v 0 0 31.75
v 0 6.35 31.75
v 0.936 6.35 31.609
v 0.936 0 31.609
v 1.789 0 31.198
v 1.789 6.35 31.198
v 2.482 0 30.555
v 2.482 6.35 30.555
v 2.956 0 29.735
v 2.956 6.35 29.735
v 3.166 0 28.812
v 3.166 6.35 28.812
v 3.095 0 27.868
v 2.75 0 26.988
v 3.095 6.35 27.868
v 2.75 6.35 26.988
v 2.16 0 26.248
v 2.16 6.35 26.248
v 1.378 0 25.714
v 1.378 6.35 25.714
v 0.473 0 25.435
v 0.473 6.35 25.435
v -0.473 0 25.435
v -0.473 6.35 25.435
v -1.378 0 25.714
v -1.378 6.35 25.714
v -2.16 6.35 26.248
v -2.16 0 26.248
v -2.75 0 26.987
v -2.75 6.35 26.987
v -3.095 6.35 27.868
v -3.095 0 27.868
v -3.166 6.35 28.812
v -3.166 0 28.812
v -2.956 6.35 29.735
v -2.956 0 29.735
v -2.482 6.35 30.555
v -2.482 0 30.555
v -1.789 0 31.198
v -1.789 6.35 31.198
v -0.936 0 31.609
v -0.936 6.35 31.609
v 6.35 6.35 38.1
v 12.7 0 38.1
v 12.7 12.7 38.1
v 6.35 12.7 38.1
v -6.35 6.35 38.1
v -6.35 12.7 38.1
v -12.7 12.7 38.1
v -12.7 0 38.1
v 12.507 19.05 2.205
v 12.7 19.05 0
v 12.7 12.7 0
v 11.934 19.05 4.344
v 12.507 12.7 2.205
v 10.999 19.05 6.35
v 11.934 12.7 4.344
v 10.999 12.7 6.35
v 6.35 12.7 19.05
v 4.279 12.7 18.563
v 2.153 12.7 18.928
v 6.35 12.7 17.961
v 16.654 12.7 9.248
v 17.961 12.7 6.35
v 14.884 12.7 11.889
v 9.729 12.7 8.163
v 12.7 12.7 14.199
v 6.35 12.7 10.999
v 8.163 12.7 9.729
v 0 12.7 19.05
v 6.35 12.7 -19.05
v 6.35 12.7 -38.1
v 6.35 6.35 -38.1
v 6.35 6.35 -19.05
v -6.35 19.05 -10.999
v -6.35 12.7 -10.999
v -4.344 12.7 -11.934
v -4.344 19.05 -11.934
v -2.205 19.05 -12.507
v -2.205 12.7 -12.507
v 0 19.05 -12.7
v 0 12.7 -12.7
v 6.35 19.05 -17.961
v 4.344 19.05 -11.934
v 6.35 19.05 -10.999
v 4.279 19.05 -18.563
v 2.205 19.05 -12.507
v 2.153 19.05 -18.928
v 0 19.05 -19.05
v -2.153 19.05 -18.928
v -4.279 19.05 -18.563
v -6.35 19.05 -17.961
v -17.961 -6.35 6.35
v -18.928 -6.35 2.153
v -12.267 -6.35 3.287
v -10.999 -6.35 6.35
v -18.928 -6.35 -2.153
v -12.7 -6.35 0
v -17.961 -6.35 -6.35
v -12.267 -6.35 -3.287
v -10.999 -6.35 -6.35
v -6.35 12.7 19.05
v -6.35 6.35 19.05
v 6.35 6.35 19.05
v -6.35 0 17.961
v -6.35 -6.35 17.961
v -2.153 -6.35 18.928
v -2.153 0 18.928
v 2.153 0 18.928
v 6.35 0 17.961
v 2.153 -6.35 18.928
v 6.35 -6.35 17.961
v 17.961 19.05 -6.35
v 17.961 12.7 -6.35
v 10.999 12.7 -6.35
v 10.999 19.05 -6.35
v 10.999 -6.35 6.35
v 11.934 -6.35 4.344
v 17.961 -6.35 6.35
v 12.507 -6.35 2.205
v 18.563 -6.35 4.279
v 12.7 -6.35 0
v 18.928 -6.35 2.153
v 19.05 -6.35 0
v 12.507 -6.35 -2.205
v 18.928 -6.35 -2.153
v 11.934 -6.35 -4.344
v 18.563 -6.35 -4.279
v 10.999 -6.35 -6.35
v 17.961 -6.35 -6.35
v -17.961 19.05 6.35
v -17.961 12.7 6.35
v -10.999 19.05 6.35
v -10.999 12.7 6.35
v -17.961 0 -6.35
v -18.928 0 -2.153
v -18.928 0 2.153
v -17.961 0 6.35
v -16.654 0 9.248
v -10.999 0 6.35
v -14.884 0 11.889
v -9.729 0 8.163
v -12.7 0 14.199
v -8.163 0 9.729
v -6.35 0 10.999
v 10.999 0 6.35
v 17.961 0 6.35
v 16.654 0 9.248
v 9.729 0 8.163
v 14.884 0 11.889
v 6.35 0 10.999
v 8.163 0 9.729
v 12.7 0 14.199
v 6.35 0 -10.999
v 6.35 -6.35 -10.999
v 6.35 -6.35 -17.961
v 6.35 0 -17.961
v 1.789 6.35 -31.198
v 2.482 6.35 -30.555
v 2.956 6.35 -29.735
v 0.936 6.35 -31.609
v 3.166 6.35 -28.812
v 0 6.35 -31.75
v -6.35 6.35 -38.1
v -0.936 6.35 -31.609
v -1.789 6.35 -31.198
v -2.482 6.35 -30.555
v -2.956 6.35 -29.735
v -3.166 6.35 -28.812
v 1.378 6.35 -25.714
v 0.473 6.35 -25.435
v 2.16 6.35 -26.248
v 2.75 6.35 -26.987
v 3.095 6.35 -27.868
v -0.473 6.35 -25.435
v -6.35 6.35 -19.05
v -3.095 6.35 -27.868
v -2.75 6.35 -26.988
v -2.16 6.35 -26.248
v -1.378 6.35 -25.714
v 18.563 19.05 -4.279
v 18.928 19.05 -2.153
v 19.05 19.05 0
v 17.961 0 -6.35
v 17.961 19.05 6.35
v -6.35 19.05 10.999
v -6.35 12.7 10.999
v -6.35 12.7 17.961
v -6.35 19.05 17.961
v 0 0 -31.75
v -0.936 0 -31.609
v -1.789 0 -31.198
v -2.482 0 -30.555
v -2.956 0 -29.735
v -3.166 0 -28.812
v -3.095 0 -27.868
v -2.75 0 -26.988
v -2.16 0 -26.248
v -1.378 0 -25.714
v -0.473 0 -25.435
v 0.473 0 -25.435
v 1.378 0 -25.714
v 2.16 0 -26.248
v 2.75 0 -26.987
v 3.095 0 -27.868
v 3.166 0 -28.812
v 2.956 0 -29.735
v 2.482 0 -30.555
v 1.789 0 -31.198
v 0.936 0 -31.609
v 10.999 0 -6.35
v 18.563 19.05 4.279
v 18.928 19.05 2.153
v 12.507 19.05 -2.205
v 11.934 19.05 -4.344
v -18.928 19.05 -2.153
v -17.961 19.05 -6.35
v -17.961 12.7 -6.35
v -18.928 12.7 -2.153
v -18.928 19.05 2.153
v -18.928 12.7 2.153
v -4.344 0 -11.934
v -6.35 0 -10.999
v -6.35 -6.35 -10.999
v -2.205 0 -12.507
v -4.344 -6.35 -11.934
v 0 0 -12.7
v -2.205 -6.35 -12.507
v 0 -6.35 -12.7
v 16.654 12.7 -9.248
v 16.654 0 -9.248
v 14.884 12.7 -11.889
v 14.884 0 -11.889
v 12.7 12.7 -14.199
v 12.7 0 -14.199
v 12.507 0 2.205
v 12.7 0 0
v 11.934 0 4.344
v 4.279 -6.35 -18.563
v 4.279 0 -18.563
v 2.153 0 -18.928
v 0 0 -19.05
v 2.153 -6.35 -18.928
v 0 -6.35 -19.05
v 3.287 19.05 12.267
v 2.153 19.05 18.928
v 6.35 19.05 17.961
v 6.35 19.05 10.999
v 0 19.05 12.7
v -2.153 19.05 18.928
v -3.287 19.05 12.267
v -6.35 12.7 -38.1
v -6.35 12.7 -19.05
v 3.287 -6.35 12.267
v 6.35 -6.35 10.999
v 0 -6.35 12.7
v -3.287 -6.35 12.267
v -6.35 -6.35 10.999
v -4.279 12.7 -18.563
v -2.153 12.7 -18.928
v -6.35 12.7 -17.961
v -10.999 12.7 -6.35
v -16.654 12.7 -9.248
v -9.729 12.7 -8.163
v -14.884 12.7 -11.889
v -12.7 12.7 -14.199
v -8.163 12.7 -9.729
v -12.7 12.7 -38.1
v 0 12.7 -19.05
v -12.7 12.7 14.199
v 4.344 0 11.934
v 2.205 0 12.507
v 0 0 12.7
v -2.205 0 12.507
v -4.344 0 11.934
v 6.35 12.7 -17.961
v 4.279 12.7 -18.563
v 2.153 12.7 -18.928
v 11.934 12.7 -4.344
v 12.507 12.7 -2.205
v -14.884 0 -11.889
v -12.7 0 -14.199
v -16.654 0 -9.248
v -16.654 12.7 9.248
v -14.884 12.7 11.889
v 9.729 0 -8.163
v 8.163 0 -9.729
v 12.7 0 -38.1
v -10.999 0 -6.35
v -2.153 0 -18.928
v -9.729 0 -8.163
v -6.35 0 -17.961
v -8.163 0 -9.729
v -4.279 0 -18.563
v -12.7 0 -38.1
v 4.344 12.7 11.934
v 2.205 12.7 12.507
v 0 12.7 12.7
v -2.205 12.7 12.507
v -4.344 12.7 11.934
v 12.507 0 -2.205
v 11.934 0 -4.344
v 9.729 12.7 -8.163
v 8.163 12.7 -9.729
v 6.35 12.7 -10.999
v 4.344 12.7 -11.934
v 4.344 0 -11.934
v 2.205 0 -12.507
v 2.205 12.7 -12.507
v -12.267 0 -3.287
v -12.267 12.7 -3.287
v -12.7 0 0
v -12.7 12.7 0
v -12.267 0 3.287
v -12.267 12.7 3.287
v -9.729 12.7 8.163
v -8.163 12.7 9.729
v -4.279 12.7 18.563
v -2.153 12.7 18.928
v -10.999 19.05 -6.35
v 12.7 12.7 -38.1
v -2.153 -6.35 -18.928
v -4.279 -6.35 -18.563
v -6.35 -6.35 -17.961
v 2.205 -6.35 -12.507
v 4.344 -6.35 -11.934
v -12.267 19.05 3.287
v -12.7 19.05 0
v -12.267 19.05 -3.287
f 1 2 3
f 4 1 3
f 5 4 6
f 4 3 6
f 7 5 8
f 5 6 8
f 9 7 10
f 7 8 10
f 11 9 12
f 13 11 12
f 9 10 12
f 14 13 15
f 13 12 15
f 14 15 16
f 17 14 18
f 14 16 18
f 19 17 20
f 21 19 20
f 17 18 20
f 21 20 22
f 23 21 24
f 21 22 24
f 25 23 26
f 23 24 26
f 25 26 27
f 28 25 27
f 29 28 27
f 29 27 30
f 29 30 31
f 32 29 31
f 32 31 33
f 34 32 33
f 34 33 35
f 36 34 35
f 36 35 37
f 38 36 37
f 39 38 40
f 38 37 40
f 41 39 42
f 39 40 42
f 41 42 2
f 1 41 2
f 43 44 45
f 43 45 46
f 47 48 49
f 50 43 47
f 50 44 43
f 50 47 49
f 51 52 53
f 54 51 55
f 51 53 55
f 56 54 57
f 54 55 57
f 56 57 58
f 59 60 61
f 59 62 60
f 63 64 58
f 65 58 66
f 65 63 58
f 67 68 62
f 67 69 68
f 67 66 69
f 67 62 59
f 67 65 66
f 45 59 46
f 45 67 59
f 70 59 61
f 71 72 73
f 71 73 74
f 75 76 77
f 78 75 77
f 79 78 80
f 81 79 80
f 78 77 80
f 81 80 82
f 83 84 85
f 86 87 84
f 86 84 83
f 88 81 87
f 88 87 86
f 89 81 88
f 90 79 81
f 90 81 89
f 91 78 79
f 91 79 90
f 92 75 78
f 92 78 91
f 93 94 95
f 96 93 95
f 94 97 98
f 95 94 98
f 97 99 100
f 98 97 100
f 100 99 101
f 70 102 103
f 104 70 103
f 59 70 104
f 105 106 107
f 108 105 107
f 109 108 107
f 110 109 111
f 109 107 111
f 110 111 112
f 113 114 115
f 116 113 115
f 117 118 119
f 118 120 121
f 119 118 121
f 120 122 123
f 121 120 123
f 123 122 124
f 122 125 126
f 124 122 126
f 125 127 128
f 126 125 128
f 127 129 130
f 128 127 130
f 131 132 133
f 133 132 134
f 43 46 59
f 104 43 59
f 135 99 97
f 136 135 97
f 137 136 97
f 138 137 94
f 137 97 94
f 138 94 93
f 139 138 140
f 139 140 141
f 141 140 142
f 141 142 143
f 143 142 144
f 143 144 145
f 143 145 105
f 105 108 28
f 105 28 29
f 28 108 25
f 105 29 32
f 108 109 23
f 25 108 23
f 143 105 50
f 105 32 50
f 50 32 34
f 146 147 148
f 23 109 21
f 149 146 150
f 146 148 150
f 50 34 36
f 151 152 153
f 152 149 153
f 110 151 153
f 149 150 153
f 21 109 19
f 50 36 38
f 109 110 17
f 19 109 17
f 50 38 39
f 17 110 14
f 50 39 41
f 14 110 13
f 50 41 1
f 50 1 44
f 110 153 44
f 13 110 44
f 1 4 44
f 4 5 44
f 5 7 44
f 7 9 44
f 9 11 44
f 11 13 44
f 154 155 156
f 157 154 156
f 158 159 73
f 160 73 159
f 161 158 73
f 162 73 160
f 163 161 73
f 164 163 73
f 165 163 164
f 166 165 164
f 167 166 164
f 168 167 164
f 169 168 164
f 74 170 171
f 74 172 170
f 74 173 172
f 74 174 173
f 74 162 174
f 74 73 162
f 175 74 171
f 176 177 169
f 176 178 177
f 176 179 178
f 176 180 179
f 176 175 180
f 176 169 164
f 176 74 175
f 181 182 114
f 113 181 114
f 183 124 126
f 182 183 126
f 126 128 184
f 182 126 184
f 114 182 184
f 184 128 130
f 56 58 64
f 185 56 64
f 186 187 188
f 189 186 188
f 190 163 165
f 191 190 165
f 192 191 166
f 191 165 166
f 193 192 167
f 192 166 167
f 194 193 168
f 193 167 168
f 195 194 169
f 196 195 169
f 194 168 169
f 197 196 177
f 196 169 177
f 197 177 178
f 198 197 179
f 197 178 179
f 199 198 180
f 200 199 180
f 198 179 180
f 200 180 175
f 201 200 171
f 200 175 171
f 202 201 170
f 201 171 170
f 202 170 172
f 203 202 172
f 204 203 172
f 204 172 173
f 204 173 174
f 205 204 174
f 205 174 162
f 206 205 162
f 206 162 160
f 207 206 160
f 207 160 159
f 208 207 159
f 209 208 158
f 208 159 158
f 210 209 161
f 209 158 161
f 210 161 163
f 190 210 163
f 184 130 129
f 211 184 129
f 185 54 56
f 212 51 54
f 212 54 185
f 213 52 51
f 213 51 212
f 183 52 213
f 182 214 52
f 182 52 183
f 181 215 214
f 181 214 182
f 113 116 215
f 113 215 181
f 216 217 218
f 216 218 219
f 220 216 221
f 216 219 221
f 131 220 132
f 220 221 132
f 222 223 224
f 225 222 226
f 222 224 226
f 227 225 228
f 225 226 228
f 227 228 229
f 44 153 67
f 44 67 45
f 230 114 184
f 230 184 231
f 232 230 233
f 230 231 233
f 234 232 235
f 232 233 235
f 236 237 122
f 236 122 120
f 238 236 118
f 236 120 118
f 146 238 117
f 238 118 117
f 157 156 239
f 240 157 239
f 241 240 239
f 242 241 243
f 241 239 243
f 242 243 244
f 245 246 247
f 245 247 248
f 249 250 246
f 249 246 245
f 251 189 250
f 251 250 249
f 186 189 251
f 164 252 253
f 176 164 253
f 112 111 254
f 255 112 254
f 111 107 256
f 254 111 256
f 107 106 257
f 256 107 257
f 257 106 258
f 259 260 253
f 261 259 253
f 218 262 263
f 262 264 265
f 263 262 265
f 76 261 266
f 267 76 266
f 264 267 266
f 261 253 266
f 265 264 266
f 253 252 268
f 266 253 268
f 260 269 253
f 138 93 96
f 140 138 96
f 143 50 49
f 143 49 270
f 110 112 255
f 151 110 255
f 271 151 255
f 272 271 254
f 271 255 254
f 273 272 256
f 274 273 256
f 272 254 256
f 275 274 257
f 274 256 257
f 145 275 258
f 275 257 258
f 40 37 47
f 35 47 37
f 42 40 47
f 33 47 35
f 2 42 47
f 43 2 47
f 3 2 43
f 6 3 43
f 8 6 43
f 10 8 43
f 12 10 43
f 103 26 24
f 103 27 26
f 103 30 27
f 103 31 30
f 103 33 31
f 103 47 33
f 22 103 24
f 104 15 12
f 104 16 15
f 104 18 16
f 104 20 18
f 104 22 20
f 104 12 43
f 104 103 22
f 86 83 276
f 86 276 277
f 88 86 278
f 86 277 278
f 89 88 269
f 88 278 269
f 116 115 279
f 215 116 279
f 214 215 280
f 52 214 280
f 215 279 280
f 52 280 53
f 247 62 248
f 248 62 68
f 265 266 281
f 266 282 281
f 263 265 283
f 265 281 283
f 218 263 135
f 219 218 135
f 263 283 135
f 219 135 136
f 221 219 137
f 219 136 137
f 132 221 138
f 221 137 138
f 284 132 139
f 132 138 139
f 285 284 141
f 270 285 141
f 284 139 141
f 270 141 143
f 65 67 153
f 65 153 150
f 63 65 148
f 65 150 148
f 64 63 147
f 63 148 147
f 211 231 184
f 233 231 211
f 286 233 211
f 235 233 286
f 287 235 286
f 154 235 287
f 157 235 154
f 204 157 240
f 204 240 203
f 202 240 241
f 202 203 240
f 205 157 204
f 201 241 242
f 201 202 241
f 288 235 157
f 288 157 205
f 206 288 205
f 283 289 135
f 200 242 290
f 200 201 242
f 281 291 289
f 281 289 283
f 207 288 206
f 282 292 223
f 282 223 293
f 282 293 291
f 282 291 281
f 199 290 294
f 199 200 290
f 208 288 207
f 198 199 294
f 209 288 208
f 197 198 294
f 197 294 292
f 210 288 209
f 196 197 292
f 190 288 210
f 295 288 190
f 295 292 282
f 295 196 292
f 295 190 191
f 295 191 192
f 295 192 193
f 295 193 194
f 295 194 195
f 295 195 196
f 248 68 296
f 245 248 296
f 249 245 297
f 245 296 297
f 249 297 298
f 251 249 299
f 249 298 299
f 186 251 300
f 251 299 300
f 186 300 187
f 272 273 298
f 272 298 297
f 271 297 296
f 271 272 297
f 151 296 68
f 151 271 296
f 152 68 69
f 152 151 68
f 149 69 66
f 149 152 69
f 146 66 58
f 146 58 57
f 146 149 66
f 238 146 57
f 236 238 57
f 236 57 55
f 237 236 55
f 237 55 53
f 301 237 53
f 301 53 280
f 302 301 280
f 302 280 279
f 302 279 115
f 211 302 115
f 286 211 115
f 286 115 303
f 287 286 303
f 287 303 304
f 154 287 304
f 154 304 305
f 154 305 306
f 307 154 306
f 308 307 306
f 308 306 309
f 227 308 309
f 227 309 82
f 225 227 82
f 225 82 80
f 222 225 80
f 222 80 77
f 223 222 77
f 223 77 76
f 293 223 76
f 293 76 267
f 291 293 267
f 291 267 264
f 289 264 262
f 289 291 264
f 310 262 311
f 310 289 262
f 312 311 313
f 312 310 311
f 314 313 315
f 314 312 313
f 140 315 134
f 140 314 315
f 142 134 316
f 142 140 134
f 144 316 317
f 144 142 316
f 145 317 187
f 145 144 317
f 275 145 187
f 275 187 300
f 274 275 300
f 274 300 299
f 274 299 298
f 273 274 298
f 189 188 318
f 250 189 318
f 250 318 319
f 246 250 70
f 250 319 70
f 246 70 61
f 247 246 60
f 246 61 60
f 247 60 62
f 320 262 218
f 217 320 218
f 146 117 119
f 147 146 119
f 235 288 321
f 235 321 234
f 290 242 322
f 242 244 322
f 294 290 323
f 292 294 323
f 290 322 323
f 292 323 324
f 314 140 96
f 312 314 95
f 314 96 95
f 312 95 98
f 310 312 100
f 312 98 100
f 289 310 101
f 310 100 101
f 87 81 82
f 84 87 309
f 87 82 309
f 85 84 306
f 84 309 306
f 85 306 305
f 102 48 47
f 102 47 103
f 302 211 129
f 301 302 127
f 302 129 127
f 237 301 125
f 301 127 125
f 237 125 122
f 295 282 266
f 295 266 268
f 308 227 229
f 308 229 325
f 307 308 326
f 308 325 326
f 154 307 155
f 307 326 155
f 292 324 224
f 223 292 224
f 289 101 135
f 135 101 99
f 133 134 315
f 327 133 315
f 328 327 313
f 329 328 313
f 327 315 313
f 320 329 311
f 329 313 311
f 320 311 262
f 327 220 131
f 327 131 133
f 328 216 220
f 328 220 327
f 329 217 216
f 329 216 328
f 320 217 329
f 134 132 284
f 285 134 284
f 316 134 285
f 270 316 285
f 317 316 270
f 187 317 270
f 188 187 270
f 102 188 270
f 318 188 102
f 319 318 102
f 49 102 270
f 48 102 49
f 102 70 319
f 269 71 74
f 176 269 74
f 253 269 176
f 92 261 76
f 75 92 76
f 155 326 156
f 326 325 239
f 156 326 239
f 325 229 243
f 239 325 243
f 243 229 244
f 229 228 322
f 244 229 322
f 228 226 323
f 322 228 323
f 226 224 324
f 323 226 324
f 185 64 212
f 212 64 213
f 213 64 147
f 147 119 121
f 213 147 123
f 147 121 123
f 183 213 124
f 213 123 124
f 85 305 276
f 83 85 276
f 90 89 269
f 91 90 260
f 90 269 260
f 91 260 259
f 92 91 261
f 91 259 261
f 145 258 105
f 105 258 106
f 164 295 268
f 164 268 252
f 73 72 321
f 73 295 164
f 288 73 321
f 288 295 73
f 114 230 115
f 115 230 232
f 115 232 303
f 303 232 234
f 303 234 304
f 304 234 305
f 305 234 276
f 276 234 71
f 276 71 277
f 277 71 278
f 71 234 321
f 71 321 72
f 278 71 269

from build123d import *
from build123d.topology import SkipClean

# Parameters (mm, degrees)
SKETCH1_R           = 19.05
SKETCH1_R_2         = 12.7
BOSS_EXTRUDE1_DEPTH = 12.7
BOSS_EXTRUDE4_START = -19.05
BOSS_EXTRUDE4_DEPTH = 25.4
BOSS_EXTRUDE7_DEPTH = 12.7
CIRPATTERN3_COUNT   = 2
CIRPATTERN3_ANGLE   = 90
SKETCH14_W          = 12.7
SKETCH14_H          = 19.05
CUT_EXTRUDE1_DEPTH  = 6.35
SKETCH15_R          = 3.175
CUT_EXTRUDE2_DEPTH  = 6.35
CIRPATTERN4_COUNT   = 2


with BuildPart() as part:
    # Sketch1 → Boss-Extrude1 (new body)
    with BuildSketch(Plane(origin=(0, 0, 0), x_dir=(1, 0, 0), z_dir=(0, 1, 0))):
        with Locations(Location((0, 0, 0), (0, 0, 270))):
            Circle(SKETCH1_R)
        with Locations(Location((0, 0, 0), (0, 0, 270))):
            Circle(SKETCH1_R_2, mode=Mode.SUBTRACT)
    extrude(amount=BOSS_EXTRUDE1_DEPTH)

    # Sketch5 → Boss-Extrude4 (add)
    with SkipClean():  # the faces are left unmerged after this step: merging them gives an invalid solid
        with BuildSketch(Plane(origin=(0, 12.7, 0), x_dir=(1, 0, 0), z_dir=(0, 1, 0)).offset(BOSS_EXTRUDE4_START)):
            with BuildLine():
                ThreePointArc((-17.960512, 6.35), (-19.05, 0), (-17.960512, -6.35))
                Line((-17.960512, -6.35), (-10.998523, -6.35))
                ThreePointArc((-10.998523, -6.35), (-12.7, 0), (-10.998523, 6.35))
                Line((-10.998523, 6.35), (-17.960512, 6.35))
            make_face()
            with BuildLine():
                Line((10.998523, -6.35), (17.960512, -6.35))
                ThreePointArc((17.960512, -6.35), (18.775653, -3.221393), (19.05, 0))
                ThreePointArc((19.05, 0), (18.775653, 3.221393), (17.960512, 6.35))
                Line((17.960512, 6.35), (10.998523, 6.35))
                ThreePointArc((10.998523, 6.35), (12.267258, 3.287002), (12.7, 0))
                ThreePointArc((12.7, 0), (12.267258, -3.287002), (10.998523, -6.35))
            make_face()
        boss_extrude4 = extrude(amount=BOSS_EXTRUDE4_DEPTH)

    # Sketch13 → Boss-Extrude7 (add)
    with SkipClean():  # the faces are left unmerged after this step: merging them gives an invalid solid
        with BuildSketch(Plane.XZ):
            with BuildLine():
                ThreePointArc((0, 19.05), (6.797461, 17.795983), (12.7, 14.199032))
                Line((12.7, 14.199032), (12.7, 38.1))
                Line((12.7, 38.1), (-12.7, 38.1))
                Line((-12.7, 38.1), (-12.7, 14.199032))
                ThreePointArc((-12.7, 14.199032), (-6.797461, 17.795983), (0, 19.05))
            make_face()
        boss_extrude7 = extrude(amount=-BOSS_EXTRUDE7_DEPTH)

    # CirPattern3: Boss-Extrude4 ×2 about axis
    with SkipClean():  # the faces are left unmerged after this step: merging them gives an invalid solid
        cirpattern3_axis = Axis((0, 12.7, 0), (0, 1, 0))
        for i in range(1, CIRPATTERN3_COUNT):
            add(boss_extrude4.rotate(cirpattern3_axis, i * CIRPATTERN3_ANGLE / (CIRPATTERN3_COUNT - 1)))

    # Sketch14 → Cut-Extrude1 (cut)
    with SkipClean():  # the faces are left unmerged after this step: merging them gives an invalid solid
        with BuildSketch(Plane(origin=(0, 12.7, 0), x_dir=(1, 0, 0), z_dir=(0, 1, 0))):
            with Locations((0, -28.575)):
                Rectangle(SKETCH14_W, SKETCH14_H)
        cut_extrude1 = extrude(amount=-CUT_EXTRUDE1_DEPTH, mode=Mode.SUBTRACT)

    # Sketch15 → Cut-Extrude2 (cut)
    with SkipClean():  # the faces are left unmerged after this step: merging them gives an invalid solid
        with BuildSketch(Plane(origin=(0, 6.35, 0), x_dir=(1, 0, 0), z_dir=(0, 1, 0))):
            with Locations(Location((0, -28.575, 0), (0, 0, 270))):
                Circle(SKETCH15_R)
        cut_extrude2 = extrude(amount=-CUT_EXTRUDE2_DEPTH, mode=Mode.SUBTRACT)

    # CirPattern4: Boss-Extrude7, Cut-Extrude1, Cut-Extrude2 ×2 about axis
    cirpattern4_axis = Axis((0, 0, 0), (0, 1, 0))
    add([boss_extrude7.rotate(cirpattern4_axis, i * 360 / CIRPATTERN4_COUNT) for i in range(1, CIRPATTERN4_COUNT)])
    add([cut_extrude1.rotate(cirpattern4_axis, i * 360 / CIRPATTERN4_COUNT) for i in range(1, CIRPATTERN4_COUNT)], mode=Mode.SUBTRACT)
    add([cut_extrude2.rotate(cirpattern4_axis, i * 360 / CIRPATTERN4_COUNT) for i in range(1, CIRPATTERN4_COUNT)], mode=Mode.SUBTRACT)


solid = part.part
